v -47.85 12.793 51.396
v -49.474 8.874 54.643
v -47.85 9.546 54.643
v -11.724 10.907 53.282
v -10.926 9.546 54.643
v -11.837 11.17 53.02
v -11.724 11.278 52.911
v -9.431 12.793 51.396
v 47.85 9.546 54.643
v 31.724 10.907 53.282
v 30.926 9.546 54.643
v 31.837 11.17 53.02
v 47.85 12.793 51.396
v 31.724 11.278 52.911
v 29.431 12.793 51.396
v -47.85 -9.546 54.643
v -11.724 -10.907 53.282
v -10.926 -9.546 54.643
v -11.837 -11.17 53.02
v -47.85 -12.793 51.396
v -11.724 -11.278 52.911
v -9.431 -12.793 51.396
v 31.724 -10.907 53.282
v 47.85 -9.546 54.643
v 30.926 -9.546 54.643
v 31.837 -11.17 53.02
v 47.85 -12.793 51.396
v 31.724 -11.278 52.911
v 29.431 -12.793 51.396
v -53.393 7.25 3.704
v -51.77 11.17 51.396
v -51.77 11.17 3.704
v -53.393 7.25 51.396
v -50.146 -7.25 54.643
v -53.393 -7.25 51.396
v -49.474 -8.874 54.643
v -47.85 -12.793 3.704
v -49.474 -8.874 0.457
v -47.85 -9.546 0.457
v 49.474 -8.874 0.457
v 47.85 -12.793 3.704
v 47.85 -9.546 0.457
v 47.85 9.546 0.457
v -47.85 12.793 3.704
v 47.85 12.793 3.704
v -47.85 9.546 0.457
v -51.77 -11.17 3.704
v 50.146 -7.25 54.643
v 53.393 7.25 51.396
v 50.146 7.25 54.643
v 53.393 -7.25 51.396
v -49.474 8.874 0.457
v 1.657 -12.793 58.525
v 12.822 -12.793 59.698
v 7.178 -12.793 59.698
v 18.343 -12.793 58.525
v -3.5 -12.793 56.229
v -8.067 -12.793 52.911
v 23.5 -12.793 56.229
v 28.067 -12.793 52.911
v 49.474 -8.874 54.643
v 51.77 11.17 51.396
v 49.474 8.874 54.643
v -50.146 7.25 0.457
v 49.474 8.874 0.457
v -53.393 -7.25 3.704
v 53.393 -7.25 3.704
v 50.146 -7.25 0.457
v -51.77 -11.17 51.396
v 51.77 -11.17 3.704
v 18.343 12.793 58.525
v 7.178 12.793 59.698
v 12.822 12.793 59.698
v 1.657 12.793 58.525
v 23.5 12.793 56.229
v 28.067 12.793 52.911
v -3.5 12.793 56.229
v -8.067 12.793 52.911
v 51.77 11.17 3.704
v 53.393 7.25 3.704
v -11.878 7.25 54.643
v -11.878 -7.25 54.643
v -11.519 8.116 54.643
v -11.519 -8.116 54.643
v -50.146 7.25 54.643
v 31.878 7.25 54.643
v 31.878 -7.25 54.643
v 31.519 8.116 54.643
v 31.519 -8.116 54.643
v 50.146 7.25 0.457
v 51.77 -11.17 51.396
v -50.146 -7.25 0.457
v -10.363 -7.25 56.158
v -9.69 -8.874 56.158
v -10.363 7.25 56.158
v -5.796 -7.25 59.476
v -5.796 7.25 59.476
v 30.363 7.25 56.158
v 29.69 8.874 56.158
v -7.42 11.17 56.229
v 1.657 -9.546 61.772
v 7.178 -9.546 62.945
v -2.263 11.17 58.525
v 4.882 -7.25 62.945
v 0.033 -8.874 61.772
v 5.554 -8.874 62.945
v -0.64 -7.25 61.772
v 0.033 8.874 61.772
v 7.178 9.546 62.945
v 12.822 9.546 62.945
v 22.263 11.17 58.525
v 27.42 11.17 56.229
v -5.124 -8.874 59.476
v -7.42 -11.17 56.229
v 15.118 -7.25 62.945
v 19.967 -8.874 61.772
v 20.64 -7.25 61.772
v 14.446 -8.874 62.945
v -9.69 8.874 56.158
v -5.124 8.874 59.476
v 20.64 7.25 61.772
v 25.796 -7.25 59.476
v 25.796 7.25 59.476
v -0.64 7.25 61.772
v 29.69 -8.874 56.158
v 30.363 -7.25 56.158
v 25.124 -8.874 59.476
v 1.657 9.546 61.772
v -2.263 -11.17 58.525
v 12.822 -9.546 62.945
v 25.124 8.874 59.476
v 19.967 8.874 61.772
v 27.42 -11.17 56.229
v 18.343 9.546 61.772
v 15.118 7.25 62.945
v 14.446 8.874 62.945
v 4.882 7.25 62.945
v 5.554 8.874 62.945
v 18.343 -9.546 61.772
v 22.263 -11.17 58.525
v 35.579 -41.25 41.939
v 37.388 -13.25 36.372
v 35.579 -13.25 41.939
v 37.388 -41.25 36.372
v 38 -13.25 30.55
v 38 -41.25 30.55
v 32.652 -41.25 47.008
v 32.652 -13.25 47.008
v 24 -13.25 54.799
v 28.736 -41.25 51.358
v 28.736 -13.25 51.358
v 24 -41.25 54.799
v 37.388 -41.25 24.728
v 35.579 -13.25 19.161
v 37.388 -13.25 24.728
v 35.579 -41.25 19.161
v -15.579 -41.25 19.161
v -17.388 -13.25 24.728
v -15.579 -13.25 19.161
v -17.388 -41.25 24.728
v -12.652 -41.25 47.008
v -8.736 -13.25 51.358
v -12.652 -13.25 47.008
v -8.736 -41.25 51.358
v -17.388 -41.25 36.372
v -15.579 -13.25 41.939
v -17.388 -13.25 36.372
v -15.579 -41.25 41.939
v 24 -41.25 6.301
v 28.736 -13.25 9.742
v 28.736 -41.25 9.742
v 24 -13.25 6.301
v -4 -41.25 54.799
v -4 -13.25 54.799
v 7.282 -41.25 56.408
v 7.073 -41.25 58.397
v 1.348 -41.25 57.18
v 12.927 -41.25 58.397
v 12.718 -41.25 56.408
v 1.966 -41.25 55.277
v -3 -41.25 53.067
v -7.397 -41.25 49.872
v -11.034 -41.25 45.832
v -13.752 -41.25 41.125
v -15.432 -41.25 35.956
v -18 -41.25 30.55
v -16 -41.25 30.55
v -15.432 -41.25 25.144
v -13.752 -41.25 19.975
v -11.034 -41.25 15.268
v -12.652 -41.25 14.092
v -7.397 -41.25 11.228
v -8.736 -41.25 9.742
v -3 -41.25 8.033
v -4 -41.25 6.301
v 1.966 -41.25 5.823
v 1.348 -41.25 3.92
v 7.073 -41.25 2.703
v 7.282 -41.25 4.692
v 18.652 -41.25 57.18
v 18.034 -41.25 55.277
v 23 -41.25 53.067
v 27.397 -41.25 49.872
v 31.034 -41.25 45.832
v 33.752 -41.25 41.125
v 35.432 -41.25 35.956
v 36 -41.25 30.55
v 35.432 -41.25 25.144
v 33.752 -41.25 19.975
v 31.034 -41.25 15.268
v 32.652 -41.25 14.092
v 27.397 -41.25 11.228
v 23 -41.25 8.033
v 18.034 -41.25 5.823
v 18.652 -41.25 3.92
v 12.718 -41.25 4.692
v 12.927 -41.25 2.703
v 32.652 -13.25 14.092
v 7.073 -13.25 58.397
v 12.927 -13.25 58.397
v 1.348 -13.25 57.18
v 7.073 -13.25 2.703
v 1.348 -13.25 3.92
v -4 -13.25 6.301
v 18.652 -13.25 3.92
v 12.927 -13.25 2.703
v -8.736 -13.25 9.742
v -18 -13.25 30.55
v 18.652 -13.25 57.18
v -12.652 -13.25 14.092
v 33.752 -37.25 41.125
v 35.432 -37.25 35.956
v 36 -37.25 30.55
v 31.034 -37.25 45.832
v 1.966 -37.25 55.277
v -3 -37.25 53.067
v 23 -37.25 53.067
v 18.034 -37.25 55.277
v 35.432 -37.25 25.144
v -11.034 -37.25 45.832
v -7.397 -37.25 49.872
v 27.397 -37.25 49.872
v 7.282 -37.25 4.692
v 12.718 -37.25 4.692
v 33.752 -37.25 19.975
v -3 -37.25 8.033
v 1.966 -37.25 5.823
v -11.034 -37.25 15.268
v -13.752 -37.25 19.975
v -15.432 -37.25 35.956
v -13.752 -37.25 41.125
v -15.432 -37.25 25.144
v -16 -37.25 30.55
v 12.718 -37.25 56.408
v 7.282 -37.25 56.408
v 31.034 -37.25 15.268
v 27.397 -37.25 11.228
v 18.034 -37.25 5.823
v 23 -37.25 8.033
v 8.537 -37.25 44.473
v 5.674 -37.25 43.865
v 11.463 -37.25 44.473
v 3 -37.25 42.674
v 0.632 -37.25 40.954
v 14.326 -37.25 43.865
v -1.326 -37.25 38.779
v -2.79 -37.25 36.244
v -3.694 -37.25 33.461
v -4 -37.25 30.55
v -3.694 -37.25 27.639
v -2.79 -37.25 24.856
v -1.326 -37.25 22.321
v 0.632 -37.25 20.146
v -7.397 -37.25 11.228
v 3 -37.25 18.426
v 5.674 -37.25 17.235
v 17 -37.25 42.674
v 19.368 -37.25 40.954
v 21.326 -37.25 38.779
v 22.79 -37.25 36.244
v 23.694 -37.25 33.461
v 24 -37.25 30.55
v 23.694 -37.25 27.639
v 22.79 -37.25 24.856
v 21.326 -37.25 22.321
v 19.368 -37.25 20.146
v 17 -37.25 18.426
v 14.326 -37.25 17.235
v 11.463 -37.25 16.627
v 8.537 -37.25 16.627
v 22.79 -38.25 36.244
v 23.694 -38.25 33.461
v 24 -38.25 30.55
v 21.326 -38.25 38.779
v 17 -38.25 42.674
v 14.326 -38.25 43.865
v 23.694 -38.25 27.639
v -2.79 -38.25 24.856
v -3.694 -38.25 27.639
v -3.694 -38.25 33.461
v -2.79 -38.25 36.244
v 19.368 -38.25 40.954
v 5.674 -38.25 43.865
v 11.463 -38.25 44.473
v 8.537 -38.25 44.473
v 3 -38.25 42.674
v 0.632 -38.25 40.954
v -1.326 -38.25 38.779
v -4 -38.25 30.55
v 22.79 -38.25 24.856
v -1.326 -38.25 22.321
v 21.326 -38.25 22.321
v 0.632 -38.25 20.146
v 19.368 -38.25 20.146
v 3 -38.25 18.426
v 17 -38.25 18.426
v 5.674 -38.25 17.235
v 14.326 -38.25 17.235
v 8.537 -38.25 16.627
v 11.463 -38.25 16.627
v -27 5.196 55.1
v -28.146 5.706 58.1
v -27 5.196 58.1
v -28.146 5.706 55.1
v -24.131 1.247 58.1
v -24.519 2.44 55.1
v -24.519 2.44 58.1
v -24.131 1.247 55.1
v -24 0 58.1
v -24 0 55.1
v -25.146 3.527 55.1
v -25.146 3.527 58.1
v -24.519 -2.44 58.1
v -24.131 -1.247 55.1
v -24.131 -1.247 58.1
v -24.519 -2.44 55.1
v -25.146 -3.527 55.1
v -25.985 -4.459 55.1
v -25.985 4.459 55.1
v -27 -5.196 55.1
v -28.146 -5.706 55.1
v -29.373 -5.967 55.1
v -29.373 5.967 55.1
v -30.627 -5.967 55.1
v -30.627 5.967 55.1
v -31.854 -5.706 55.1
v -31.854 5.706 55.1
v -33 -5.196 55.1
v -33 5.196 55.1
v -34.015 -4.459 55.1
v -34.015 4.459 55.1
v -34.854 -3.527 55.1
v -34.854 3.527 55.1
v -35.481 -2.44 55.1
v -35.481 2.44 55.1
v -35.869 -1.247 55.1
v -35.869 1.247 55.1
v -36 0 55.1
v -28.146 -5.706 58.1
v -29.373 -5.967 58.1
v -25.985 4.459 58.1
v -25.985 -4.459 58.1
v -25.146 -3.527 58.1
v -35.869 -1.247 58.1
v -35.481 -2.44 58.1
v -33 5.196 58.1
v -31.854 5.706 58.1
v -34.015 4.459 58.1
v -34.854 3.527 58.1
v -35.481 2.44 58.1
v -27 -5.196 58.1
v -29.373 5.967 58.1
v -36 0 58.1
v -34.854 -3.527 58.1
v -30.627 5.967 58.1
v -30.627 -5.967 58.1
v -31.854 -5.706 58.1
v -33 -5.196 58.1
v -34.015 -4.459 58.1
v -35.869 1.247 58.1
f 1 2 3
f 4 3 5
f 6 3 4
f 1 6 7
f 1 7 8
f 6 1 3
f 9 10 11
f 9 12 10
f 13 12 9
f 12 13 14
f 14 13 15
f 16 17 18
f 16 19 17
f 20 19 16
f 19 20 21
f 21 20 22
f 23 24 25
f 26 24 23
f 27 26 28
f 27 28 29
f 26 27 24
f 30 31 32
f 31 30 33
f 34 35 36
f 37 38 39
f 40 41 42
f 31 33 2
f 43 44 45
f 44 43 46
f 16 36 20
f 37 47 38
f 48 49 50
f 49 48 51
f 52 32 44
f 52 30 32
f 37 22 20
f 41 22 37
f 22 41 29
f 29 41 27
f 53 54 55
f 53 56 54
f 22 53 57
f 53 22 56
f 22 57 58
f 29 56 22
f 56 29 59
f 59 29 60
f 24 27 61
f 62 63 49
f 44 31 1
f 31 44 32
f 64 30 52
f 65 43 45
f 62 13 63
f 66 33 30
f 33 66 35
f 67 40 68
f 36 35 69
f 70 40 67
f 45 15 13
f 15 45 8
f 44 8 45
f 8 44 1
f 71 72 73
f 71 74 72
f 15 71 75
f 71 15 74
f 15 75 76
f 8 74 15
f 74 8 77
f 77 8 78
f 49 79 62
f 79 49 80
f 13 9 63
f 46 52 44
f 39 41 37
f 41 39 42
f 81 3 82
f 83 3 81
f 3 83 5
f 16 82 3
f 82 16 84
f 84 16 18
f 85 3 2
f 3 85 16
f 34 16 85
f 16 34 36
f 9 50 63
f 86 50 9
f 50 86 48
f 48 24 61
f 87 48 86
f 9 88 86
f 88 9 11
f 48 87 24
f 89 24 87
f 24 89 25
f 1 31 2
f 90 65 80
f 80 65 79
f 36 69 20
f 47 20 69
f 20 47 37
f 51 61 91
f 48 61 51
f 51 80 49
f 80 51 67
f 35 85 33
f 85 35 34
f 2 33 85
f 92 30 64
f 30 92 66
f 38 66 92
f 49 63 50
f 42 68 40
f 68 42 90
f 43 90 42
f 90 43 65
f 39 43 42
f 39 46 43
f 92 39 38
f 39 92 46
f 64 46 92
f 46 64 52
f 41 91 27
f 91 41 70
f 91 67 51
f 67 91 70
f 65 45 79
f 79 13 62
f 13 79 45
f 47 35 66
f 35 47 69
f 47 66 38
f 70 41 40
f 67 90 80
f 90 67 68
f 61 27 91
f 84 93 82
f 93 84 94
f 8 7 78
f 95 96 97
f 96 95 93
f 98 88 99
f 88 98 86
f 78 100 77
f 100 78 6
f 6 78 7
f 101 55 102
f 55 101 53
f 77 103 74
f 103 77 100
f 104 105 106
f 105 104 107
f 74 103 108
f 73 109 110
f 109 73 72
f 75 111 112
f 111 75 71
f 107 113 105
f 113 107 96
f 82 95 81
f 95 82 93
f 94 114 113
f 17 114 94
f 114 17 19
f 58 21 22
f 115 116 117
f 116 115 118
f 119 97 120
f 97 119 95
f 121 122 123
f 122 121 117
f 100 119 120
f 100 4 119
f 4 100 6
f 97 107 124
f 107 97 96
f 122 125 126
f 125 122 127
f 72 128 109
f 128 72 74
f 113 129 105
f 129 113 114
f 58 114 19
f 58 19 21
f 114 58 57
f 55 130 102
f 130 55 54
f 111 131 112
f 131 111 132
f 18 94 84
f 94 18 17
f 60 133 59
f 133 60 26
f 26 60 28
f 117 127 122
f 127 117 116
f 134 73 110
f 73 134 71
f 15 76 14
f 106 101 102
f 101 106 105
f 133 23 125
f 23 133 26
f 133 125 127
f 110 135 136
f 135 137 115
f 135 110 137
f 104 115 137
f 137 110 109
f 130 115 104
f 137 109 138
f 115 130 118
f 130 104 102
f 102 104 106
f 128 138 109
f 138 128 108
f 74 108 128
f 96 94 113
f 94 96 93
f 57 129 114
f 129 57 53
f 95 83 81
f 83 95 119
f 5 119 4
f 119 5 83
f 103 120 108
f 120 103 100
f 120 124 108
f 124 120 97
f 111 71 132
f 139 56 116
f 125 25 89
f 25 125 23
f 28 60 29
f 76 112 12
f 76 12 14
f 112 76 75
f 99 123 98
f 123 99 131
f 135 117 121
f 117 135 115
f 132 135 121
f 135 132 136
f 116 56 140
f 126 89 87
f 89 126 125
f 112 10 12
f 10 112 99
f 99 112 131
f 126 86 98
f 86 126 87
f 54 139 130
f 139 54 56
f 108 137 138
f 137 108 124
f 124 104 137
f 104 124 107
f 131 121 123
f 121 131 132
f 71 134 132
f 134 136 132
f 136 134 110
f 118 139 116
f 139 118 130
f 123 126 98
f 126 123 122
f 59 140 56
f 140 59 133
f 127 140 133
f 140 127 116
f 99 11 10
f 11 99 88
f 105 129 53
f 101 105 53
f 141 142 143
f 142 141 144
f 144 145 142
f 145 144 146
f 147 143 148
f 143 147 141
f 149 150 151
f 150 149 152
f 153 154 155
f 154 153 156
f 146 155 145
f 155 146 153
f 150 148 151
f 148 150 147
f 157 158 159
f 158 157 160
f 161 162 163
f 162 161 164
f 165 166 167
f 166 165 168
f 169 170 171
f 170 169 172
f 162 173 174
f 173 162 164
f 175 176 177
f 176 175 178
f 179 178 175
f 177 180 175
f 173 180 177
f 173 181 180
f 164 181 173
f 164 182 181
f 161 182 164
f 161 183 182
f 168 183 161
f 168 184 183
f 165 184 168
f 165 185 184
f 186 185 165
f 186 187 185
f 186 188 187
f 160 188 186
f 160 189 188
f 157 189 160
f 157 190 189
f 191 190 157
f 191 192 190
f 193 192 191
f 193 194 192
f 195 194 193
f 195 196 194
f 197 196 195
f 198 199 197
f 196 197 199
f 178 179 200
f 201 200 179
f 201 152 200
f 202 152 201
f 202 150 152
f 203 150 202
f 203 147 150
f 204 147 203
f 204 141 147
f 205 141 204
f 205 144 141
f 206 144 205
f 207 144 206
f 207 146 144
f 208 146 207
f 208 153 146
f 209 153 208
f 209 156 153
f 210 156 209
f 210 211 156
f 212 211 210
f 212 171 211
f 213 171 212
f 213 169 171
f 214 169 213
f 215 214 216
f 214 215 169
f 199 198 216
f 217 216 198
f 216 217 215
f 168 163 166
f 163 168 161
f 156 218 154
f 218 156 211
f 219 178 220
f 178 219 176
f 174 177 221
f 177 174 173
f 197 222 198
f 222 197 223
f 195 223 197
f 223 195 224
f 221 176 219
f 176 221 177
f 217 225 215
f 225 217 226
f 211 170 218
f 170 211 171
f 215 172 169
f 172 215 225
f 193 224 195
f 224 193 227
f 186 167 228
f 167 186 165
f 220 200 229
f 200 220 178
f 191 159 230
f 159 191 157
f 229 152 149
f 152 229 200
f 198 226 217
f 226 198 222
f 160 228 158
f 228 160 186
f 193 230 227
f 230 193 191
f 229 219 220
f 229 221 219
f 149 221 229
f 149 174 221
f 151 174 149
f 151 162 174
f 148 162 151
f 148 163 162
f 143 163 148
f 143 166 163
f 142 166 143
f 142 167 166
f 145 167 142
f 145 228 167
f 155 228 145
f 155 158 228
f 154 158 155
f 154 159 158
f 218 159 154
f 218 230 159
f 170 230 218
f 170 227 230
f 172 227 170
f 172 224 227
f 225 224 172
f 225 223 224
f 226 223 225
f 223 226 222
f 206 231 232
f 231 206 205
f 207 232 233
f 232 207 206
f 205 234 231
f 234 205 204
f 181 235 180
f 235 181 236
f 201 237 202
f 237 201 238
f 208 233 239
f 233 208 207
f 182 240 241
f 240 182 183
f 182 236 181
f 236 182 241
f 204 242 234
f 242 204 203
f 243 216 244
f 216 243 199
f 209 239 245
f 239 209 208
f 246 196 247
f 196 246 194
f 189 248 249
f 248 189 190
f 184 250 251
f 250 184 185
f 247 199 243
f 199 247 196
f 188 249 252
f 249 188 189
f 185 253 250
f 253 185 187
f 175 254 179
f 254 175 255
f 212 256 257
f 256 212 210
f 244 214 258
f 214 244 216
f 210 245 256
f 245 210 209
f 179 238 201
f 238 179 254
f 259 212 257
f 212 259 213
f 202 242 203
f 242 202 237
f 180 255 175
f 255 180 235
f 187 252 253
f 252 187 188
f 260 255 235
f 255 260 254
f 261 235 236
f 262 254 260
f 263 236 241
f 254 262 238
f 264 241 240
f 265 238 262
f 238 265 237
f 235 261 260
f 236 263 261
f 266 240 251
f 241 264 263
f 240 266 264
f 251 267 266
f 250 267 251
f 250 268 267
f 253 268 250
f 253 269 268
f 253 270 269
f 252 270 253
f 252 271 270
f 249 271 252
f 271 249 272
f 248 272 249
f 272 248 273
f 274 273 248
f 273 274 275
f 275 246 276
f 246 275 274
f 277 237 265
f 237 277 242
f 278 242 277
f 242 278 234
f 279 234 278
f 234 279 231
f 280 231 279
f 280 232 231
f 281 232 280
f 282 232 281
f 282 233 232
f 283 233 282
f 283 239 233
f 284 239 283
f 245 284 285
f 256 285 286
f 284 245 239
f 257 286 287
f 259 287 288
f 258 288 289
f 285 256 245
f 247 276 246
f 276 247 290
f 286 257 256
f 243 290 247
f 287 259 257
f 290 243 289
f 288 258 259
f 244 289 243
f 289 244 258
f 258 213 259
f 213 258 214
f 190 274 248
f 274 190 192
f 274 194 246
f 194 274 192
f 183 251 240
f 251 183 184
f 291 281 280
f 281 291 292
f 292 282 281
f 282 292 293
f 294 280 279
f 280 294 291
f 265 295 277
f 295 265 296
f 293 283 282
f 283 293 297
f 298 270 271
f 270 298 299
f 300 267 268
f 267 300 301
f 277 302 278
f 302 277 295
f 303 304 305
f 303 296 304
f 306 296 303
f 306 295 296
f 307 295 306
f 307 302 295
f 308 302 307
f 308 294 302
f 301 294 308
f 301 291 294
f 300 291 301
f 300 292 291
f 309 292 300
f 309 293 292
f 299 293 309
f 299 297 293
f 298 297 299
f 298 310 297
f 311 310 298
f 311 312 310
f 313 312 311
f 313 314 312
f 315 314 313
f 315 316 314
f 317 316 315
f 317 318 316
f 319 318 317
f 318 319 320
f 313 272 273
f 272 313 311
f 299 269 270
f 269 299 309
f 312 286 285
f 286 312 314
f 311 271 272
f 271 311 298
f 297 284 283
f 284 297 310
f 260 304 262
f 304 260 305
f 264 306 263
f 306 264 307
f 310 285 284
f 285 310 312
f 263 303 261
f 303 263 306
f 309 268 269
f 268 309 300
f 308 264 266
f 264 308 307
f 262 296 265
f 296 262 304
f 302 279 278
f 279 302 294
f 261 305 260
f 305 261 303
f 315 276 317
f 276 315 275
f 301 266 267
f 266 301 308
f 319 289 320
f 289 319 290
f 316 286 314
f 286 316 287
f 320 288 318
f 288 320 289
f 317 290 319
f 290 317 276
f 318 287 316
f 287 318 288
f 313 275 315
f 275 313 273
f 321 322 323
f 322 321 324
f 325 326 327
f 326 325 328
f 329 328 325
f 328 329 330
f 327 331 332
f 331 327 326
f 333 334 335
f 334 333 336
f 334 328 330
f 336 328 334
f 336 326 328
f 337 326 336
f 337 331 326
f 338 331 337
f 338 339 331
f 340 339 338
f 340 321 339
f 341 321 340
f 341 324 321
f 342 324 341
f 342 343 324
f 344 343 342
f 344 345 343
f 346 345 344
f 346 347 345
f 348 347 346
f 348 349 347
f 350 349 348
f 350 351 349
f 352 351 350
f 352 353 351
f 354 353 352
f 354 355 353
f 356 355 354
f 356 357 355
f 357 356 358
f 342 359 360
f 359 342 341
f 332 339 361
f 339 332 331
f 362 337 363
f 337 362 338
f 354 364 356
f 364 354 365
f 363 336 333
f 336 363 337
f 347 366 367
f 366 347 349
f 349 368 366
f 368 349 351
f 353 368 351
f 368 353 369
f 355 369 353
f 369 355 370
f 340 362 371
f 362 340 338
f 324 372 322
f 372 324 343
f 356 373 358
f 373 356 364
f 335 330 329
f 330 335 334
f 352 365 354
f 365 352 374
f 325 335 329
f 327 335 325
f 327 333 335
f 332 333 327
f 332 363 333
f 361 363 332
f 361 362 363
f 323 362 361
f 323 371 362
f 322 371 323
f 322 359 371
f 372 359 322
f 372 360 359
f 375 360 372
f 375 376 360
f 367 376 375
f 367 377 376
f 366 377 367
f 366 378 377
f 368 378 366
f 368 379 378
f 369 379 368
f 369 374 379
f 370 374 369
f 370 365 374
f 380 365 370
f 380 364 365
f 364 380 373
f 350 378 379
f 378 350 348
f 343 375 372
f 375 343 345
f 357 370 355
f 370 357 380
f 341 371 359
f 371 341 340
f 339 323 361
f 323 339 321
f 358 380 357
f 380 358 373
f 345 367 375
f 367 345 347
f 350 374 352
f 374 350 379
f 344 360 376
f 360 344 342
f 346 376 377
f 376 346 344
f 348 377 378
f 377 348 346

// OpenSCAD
// file: cameras_h.scad
//
// QP_OpenSCAD_lib
//
// GNU GPL v3
// quackingplums@gmail.com
//
// Cameras - header definitions
//

// Camera types
GoPro_HD_Hero3_Black = ["GoPro HD Hero3: Black Edition",		// GoPro HD Hero3	 ** VERIFIED **
	59.1, 41, 21.1,					// width, height, depth
	"None",							// mount type ** DEPRECATED **
	23.0, 15.05, 7.85, 7.0, 1.2];		// lens diameter, lens x-offset, lens y-offset, lens z-offset (from center), lens dome

// mass = 75g
// CoG left/right ~ 30mm/30mm
// CoG top/bottom ~ 22mm/18mm
// CoG front/back ~ 12mm/9mm
// FoV = 114mm

GoPro_HD_Hero2 = ["GoPro HD Hero2",							// GoPro HD Hero2 ** VERIFIED **
	60.1, 42.1, 30.1,					// width, height, depth
	"None",							// mount type ** DEPRECATED **
	20.0, 14.6, 6, 3.6, 2.0];			// lens diameter, lens x-offset, lens y-offset, lens z-offset (from center), lens dome

GoPro_HD_Hero = ["GoPro HD Hero",								// GoPro HD Hero ** VERIFIED **
	60.1, 41.9, 30.15,				// width, height, depth
	"None",							// mount type ** DEPRECATED **
	20.2, 14.6, 6, 3.6, 1.5];			// lens diameter, lens x-offset, lens y-offset, lens z-offset (from center), lens dome

Panasonic_GF3 = ["Panasonic Lumix DMC-GF3",
	107.7, 67.1, 32.5,
	"1/4inUNC",
	56, 10, 28, -3, 0];

Sony_NEX5N = ["Sony NEX-5N",
	111, 59, 38,
	"1/4inUNC",
	0, 0, 0, 0, 0];

/*
name
width
height
depth
mount type							*** DEPRECATED ***
lens diameter
lens x-offset from center
lens y-offset from front of body (how far main ring sticks out)
lens z-offset from center
lens dome (glass protrusion from lens body) - added to y-offset
*/

function camera_name(camera_type) = camera_type[0];
function camera_width(camera_type) = camera_type[1];
function camera_height(camera_type) = camera_type[2];
function camera_depth(camera_type) = camera_type[3];
function camera_mount_type(camera_type) = camera_type[4];
function camera_lens_diameter(camera_type) = camera_type[5];
function camera_lens_dx(camera_type) = camera_type[6];
function camera_lens_dy(camera_type) = camera_type[7];
function camera_lens_dz(camera_type) = camera_type[8];
function camera_lens_dome(camera_type) = camera_type[9]; 
// main file
//
// QP_OpenSCAD_lib
//
// GNU GPL v3
// quackingplums@gmail.com
//
// Cameras
//

include <cameras_h.scad>;

$fn = 30;

ff = 0.05;	// fudge factor to prevent barfing on coincident faces

module basic_camera(camera_type = GoPro_HD_Hero3_Black)
{
	translate([0, 0, camera_height(camera_type) / 2])
		union()
		{
			color("lightgrey")
				cube([camera_width(camera_type), camera_depth(camera_type), camera_height(camera_type)], center = true);
			color("black")
				translate([camera_lens_dx(camera_type), -camera_depth(camera_type) / 2, camera_lens_dz(camera_type)])
					rotate([90, 0, 0])
						cylinder(h = camera_lens_dy(camera_type), r = camera_lens_diameter(camera_type) / 2);
		}
}

module FoV_frustum(FoV_angle = 114, lens_radius = camera_lens_diameter(GoPro_HD_Hero3_Black) / 2, depth = 3, debug = false)
{
	r1 = lens_radius;
	r2 = r1 + depth * tan(FoV_angle / 2);

	if (debug) echo(str("FoV frustum = ", r2 * 2));

	cylinder(h = depth, r1 = r1, r2 = r2);
}

module GoPro_HD_Hero3_Black()
{
	ct = GoPro_HD_Hero3_Black;

	union()
	{
		// main body
		color("black")
			linear_extrude(height = camera_height(ct))
				translate([0, 1, 0])
					square([camera_width(ct), camera_depth(ct) - 2], center = true);

		// fascia
		color("lightgrey")
			linear_extrude(height = camera_height(ct))
				translate([0, -camera_depth(ct) / 2 + 1, 0])
					square([camera_width(ct), 2], center = true);

		// lens
		translate([camera_lens_dx(ct), -camera_depth(ct) / 2, camera_lens_dz(ct) + camera_height(ct) / 2])
			rotate([90, 0, 0])
			{
				color("black")
					cylinder(h = camera_lens_dy(ct), r = camera_lens_diameter(ct) / 2);
				color("DarkSlateGray")
					cylinder(h = camera_lens_dy(ct) + 1, r = camera_lens_diameter(ct) / 2 - 4);
			}

		// shutter button
		translate([-camera_width(ct) / 2 + 13, 0, camera_height(ct)])
		{
			color("dimgray")
				cylinder(h = ff, r = 6);
			color("Red")
				cylinder(h = ff*2, r = 2.25);		
		}

		// top activity LED
		translate([-camera_width(ct) / 2 + 6, -camera_depth(ct) / 2 + 5, camera_height(ct)])
			color("DimGray")
				cylinder(h = ff, r = 1.5);

		// mode/power button
		translate([- camera_width(ct) / 2 + 13, -camera_depth(ct) / 2, 10.5])
			rotate([90, 0, 0])
				color("dimgray")
					cylinder(h = ff, r = 6.25);

		// display
		translate([-camera_width(ct) / 2 + 13, -camera_depth(ct) / 2, 16.2 / 2 + 20])
			color("DarkSlateGray")
				cube([12.5, ff, 16.2], center = true);

		// front indicators
		translate([-camera_width(ct) / 2 + 23.5, -camera_depth(ct) / 2, 14])
			rotate([90, 0, 0])
				color("WhiteSmoke")
					cylinder(h = ff, r = 2.6);
		translate([-camera_width(ct) / 2 + 23.5, -camera_depth(ct) / 2, 7])
			rotate([90, 0, 0])
				color("WhiteSmoke")
					cylinder(h = ff, r = 2.6);

		// wifi button
	}
}

// splined GoPro-specific mount
module GoPro_mount()
{
}

module Panasonic_GF3()
{
	c = Panasonic_GF3;

	width = camera_width(c);
	depth = camera_depth(c) - 6;
	height = camera_height(c);
	lens = camera_lens_dy(c);
	lens_d = camera_lens_diameter(c);
	lens_bulge = lens_d + 10;

	minkowski_sphere = 12.0;
	minkowski_radius = minkowski_sphere/2;

	union()
	{
		// main body
		color("dimgrey")
		minkowski()
		{
			
			union()
			{
				// cuboidal main chassis
				translate([-(width - minkowski_sphere)/2, -(depth - minkowski_sphere)/2, minkowski_radius])
					cube([width-minkowski_sphere, depth - minkowski_sphere, height - 12 - minkowski_sphere]);
		
				// lens bulge
				translate([camera_lens_dx(c), (depth - minkowski_sphere)/2, height/2 + camera_lens_dz(c)])
					rotate([90, 0, 0])
						difference()
						{
							cylinder(h = depth - minkowski_sphere, r = (lens_bulge - minkowski_sphere)/2);
							translate([-lens_bulge/2, -lens_bulge, -ff/2])
								cube([lens_bulge + ff, lens_bulge + ff, depth + ff]);
						}
			}

			sphere(minkowski_radius, $fn = 8);
		}

		// lens
		translate([camera_lens_dx(c), -depth/2, height/2 + camera_lens_dz(c)])
			rotate([90, 0, 0])
			{
				color("dimgrey")
				difference()
				{
					cylinder(h = lens, r = lens_d/2);
					translate([0, 0, camera_lens_dy(c) - 4])
					cylinder(h = lens, r = lens_d/2 - 2);
				}
				color("lightblue")
					cylinder(h = lens -3, r = lens_d/4);
			}

		// shutter button
		color("silver")
		translate([-30, 0, height - 12])
			cylinder(h = 3, r = 6);
	}
}

//basic_camera(GoPro_HD_Hero2);
//GoPro_HD_Hero3_Black();
//FoV_frustum();
Panasonic_GF3();
